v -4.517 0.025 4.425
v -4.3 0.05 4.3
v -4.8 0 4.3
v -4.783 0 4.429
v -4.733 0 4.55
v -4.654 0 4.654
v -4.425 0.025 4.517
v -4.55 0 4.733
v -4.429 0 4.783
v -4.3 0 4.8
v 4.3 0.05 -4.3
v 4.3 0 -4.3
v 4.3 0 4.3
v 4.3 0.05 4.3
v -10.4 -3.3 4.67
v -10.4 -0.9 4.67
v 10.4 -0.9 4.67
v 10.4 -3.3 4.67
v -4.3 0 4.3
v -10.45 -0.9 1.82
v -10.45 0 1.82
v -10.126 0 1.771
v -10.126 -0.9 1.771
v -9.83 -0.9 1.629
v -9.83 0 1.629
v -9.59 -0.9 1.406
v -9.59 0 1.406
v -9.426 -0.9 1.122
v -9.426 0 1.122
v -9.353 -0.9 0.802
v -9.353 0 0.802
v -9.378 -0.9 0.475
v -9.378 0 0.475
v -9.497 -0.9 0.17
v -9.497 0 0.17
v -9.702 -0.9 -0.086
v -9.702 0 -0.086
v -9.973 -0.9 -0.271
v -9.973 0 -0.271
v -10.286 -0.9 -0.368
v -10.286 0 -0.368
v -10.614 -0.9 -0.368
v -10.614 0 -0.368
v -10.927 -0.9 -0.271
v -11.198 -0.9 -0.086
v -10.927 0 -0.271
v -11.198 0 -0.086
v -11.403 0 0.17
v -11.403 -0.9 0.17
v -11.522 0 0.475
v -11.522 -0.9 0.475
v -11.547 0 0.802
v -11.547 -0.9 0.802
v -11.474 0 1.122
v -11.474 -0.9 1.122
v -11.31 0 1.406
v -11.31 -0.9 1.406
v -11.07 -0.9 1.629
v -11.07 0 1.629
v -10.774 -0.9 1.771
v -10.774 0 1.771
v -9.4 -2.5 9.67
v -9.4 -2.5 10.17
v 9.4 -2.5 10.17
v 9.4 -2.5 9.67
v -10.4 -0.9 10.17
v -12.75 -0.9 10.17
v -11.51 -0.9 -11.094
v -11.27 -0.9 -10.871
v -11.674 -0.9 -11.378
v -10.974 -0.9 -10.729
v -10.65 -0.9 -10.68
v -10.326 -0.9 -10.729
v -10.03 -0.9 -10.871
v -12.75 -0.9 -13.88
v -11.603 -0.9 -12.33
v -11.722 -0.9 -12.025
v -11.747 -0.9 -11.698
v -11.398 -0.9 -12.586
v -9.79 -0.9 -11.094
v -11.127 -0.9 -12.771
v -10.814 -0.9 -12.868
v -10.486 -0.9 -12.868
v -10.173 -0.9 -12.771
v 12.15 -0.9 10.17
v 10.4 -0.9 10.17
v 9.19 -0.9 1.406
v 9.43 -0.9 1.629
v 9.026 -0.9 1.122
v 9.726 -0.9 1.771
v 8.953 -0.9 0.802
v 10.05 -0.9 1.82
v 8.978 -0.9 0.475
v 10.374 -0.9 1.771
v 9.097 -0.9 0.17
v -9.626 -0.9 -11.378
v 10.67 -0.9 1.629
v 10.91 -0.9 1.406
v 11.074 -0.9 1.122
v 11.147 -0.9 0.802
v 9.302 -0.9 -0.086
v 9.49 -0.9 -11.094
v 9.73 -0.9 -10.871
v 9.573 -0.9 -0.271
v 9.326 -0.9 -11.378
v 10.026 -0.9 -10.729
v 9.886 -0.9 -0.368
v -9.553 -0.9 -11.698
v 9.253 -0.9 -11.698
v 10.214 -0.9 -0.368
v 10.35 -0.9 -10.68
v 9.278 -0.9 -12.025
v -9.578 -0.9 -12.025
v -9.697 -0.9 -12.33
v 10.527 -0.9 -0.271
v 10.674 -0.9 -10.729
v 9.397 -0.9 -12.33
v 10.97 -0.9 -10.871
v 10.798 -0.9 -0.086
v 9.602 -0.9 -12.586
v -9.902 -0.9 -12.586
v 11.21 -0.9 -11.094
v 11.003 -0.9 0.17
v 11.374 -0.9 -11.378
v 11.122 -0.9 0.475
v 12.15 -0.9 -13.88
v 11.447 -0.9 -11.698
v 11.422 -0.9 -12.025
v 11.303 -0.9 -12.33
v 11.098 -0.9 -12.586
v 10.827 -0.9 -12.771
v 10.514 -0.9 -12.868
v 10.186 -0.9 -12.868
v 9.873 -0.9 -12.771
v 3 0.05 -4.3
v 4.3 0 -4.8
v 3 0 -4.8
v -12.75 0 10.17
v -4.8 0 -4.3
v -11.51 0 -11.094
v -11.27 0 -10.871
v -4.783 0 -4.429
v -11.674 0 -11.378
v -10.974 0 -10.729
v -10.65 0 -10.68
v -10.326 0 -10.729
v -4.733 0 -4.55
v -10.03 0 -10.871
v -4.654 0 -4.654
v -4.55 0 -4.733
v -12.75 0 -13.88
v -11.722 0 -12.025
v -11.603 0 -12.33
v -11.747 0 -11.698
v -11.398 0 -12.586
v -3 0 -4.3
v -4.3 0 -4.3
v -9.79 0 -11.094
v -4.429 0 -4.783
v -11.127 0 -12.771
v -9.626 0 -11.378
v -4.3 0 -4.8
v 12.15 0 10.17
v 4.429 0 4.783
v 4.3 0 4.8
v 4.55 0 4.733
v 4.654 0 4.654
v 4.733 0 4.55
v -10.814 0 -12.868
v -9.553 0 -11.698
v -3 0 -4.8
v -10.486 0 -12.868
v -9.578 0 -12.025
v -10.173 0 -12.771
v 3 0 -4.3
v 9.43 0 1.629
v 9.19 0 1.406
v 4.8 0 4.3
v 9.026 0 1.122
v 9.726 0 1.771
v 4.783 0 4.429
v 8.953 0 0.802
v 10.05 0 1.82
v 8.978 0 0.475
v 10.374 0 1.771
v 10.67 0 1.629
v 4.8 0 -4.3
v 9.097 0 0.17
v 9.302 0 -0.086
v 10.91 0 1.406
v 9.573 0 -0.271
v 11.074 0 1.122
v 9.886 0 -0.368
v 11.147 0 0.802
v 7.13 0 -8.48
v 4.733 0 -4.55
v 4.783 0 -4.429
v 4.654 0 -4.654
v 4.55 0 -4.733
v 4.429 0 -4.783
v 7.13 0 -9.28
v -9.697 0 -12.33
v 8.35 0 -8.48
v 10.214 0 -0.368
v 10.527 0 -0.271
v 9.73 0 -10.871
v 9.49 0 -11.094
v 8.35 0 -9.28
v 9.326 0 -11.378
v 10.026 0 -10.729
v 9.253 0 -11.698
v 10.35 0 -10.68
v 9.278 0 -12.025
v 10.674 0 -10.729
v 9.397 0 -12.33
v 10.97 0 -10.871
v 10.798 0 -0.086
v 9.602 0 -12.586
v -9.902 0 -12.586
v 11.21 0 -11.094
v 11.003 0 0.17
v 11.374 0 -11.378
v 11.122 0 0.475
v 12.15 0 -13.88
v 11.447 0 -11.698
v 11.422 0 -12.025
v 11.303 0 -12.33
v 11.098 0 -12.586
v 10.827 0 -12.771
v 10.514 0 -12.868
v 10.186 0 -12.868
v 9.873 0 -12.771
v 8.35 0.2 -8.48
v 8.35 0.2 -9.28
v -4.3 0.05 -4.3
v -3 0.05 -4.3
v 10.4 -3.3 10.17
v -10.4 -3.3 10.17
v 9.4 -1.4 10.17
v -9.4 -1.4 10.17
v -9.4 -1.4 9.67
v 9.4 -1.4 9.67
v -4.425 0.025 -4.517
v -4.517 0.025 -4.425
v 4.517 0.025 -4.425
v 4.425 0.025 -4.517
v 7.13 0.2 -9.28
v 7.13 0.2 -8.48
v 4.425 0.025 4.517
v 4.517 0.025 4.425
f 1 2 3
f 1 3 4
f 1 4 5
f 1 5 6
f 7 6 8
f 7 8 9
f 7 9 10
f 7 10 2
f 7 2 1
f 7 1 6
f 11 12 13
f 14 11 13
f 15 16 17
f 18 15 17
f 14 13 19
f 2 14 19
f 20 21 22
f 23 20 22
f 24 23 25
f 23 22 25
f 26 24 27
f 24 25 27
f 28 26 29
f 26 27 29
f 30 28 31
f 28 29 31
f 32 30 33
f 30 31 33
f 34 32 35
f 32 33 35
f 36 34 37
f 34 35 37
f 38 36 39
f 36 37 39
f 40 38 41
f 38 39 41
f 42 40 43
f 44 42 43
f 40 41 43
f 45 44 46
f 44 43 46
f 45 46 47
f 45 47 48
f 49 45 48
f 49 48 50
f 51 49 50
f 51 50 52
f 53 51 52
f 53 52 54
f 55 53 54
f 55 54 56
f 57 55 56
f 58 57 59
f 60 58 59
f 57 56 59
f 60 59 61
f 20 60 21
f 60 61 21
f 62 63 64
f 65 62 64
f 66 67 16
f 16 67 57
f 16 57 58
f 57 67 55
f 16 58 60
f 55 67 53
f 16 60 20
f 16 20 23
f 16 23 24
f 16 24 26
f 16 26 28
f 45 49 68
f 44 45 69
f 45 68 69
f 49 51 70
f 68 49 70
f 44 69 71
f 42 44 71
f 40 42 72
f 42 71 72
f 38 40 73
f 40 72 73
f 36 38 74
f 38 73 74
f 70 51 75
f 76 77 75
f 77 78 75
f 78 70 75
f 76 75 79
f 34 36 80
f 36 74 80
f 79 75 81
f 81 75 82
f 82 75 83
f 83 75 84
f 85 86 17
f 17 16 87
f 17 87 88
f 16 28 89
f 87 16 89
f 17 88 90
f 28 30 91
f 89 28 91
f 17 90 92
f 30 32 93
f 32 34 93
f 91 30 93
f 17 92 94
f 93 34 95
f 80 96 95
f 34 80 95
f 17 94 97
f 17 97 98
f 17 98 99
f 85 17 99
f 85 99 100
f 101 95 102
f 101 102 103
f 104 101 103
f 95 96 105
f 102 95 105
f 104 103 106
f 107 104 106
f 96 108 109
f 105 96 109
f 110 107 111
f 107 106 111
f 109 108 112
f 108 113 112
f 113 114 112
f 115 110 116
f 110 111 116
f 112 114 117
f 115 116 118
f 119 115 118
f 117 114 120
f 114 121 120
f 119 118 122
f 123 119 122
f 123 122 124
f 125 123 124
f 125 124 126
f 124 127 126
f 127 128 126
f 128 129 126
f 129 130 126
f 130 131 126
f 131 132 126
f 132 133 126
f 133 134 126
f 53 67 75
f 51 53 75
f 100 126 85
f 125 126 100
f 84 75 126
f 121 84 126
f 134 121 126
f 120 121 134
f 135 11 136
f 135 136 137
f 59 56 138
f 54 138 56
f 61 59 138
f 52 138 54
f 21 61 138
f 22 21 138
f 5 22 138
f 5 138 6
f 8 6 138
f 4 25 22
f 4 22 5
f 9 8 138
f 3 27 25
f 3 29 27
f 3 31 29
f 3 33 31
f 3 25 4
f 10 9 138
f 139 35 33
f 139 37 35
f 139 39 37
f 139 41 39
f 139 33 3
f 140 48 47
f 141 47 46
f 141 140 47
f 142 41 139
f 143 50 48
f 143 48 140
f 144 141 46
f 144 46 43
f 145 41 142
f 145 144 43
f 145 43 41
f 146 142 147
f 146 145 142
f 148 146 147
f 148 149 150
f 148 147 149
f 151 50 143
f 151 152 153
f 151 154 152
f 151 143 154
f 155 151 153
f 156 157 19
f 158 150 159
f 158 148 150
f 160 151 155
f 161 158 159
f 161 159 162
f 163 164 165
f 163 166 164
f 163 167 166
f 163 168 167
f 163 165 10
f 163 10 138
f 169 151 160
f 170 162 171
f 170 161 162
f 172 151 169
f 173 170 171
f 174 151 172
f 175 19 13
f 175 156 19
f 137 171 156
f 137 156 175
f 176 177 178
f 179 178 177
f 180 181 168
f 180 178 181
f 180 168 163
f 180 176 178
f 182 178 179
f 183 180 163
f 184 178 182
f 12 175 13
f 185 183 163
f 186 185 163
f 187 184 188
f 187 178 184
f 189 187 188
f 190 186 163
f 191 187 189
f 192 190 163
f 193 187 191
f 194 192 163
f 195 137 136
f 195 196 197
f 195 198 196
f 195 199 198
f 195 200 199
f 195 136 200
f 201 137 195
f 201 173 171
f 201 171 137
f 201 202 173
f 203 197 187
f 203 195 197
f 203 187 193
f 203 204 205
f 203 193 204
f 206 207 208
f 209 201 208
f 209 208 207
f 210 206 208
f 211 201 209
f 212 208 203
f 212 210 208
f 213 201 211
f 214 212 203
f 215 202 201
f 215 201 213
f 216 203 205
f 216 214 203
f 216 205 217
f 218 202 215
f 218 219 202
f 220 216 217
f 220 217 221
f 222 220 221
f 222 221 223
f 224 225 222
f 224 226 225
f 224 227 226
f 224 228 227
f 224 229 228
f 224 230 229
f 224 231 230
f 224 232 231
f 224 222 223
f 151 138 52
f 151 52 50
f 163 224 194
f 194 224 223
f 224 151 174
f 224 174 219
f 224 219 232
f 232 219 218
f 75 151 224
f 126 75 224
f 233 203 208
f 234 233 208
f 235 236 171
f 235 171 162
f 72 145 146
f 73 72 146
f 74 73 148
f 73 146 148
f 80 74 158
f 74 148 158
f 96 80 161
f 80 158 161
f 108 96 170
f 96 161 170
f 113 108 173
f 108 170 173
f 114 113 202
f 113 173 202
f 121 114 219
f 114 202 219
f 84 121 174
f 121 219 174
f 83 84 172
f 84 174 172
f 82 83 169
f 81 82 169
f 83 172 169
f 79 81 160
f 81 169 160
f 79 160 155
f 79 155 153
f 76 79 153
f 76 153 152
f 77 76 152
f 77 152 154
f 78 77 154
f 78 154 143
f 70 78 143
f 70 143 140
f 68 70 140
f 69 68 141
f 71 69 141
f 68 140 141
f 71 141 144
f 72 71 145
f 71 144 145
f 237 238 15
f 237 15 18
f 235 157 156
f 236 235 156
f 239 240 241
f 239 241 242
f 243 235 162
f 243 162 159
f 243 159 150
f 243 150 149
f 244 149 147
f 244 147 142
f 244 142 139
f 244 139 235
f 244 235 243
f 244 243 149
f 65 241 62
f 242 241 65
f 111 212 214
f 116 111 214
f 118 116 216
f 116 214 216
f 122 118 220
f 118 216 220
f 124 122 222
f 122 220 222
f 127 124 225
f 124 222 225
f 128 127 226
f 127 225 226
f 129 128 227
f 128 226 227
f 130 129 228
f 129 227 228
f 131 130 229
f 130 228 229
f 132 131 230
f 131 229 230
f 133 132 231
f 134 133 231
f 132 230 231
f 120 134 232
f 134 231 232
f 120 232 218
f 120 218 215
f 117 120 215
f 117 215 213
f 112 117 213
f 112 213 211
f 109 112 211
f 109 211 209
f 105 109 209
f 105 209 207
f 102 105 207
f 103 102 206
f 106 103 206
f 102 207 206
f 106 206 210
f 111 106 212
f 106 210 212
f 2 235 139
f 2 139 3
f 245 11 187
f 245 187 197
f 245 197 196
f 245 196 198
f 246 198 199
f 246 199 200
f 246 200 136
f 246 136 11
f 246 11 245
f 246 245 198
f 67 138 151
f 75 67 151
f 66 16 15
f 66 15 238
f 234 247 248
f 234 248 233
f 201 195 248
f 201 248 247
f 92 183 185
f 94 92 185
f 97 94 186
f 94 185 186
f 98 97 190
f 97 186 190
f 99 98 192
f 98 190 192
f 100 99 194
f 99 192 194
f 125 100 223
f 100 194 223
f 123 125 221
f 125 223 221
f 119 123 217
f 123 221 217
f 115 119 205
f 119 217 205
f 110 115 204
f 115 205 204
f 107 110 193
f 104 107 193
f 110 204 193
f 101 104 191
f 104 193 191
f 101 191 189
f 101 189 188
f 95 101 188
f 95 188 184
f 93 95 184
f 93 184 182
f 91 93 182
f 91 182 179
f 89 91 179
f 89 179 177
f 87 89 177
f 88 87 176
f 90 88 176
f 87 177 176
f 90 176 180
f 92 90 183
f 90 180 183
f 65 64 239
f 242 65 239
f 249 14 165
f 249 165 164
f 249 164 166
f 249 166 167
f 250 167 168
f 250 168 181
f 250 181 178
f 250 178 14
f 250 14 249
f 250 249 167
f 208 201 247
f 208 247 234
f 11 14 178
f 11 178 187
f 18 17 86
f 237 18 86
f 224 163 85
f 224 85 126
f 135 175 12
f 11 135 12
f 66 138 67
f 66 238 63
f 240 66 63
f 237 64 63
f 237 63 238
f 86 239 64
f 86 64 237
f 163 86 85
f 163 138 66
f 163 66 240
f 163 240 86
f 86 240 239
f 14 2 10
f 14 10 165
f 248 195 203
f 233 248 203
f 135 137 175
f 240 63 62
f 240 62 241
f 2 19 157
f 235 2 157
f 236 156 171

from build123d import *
from OCP.BRepFilletAPI import BRepFilletAPI_MakeChamfer

# Parameters (mm, degrees)
SKIZZE1_W               = 24.9
SKIZZE1_H               = 24.05
SKIZZE1_R               = 1.1
PCB_DEPTH               = 0.9
BOSS_EXTRUDE1_DEPTH     = 0.05
SKIZZE3_W               = 20.8
SKIZZE3_H               = 5.5
CONNECTOR_CLOSED_DEPTH  = 2.4
ESQUISSE1_W             = 1.22
ESQUISSE1_H             = 0.8
STATUS_LED_DEPTH        = 0.2
ESQUISSE3_W             = 18.8
ESQUISSE3_H             = 1.1
ENL_V_MAT_EXTRU_1_DEPTH = 0.5
FILLET1_R               = 0.5
CHAMFER1_SIZE           = 0.05
CHAMFER1_SIZE_2         = 0.5


with BuildPart() as part:
    # Skizze1 → PCB (new body)
    with BuildSketch(Plane(origin=(0, 0, 0), x_dir=(1, 0, 0), z_dir=(0, 1, 0))):
        with Locations((-0.3, 1.855)):
            Rectangle(SKIZZE1_W, SKIZZE1_H)
        with Locations(Location((-10.65, 11.78, 0), (0, 0, 270))):
            Circle(SKIZZE1_R, mode=Mode.SUBTRACT)
        with Locations(Location((10.35, 11.78, 0), (0, 0, 270))):
            Circle(SKIZZE1_R, mode=Mode.SUBTRACT)
        with Locations(Location((-10.45, -0.72, 0), (0, 0, 270))):
            Circle(SKIZZE1_R, mode=Mode.SUBTRACT)
        with Locations(Location((10.05, -0.72, 0), (0, 0, 270))):
            Circle(SKIZZE1_R, mode=Mode.SUBTRACT)
    extrude(amount=-PCB_DEPTH)

    # Sketch4 → Boss-Extrude1 (add)
    with BuildSketch(Plane(origin=(0, 0, 0), x_dir=(1, 0, 0), z_dir=(0, 1, 0))):
        Polygon((-4.3, 4.3), (-3, 4.3), (-3, 4.8), (-4.8, 4.8), (-4.8, -4.8), (4.8, -4.8), (4.8, 4.8), (3, 4.8), (3, 4.3), (4.3, 4.3), (4.3, -4.3), (-4.3, -4.3), align=None)
    extrude(amount=BOSS_EXTRUDE1_DEPTH)

    # Skizze3 → Connector_closed (add)
    with BuildSketch(Plane.XZ.offset(0.9)):
        with Locations((0, 7.42)):
            Rectangle(SKIZZE3_W, SKIZZE3_H)
    extrude(amount=CONNECTOR_CLOSED_DEPTH)

    # Esquisse1 → Status LED (add)
    with BuildSketch(Plane(origin=(0, 0, 0), x_dir=(1, 0, 0), z_dir=(0, 1, 0))):
        with Locations((7.74, 8.88)):
            Rectangle(ESQUISSE1_W, ESQUISSE1_H)
    extrude(amount=STATUS_LED_DEPTH)

    # Esquisse3 → Enlèv. mat.-Extru.1 (cut)
    with BuildSketch(Plane.XY.offset(10.17)):
        with Locations((0, -1.95)):
            Rectangle(ESQUISSE3_W, ESQUISSE3_H)
    extrude(amount=-ENL_V_MAT_EXTRU_1_DEPTH, mode=Mode.SUBTRACT)

    # Fillet1
    fillet1_edges = [part.edges().sort_by_distance(p)[0] for p in [
        (-4.8, 0.025, -4.8),
        (-4.8, 0.025, 4.8),
        (4.8, 0.025, 4.8),
        (4.8, 0.025, -4.8),
    ]]
    fillet(fillet1_edges, radius=FILLET1_R)

    # Chamfer1
    chamfer1_edges_1 = [part.edges().sort_by_distance(p)[0] for p in [
        (3.65, 0.05, -4.8),
    ]]
    chamfer1_side_1 = [part.faces().sort_by_distance(p)[0] for p in [
        (3.65, 0.049, -4.8),
    ]]
    chamfer1_edges_2 = [part.edges().sort_by_distance(p)[0] for p in [
        (4.8, 0.05, 0),
    ]]
    chamfer1_side_2 = [part.faces().sort_by_distance(p)[0] for p in [
        (4.8, 0.049, 0),
    ]]
    chamfer1_edges_3 = [part.edges().sort_by_distance(p)[0] for p in [
        (0, 0.05, 4.8),
    ]]
    chamfer1_side_3 = [part.faces().sort_by_distance(p)[0] for p in [
        (0, 0.049, 4.8),
    ]]
    chamfer1_edges_4 = [part.edges().sort_by_distance(p)[0] for p in [
        (-4.8, 0.05, 0),
    ]]
    chamfer1_side_4 = [part.faces().sort_by_distance(p)[0] for p in [
        (-4.8, 0.049, 0),
    ]]
    chamfer1_edges_5 = [part.edges().sort_by_distance(p)[0] for p in [
        (-3.65, 0.05, -4.8),
    ]]
    chamfer1_side_5 = [part.faces().sort_by_distance(p)[0] for p in [
        (-3.65, 0.049, -4.8),
    ]]
    chamfer1_edges_6 = [part.edges().sort_by_distance(p)[0] for p in [
        (4.653553391, 0.05, -4.653553391),
    ]]
    chamfer1_side_6 = [part.faces().sort_by_distance(p)[0] for p in [
        (4.653553391, 0.049, -4.653553391),
    ]]
    chamfer1_edges_7 = [part.edges().sort_by_distance(p)[0] for p in [
        (4.653553391, 0.05, 4.653553391),
    ]]
    chamfer1_side_7 = [part.faces().sort_by_distance(p)[0] for p in [
        (4.653553391, 0.049, 4.653553391),
    ]]
    chamfer1_edges_8 = [part.edges().sort_by_distance(p)[0] for p in [
        (-4.653553391, 0.05, 4.653553391),
    ]]
    chamfer1_side_8 = [part.faces().sort_by_distance(p)[0] for p in [
        (-4.653553391, 0.049, 4.653553391),
    ]]
    chamfer1_edges_9 = [part.edges().sort_by_distance(p)[0] for p in [
        (-4.653553391, 0.05, -4.653553391),
    ]]
    chamfer1_side_9 = [part.faces().sort_by_distance(p)[0] for p in [
        (-4.653553391, 0.049, -4.653553391),
    ]]
    chamfer1 = BRepFilletAPI_MakeChamfer(part.part.solid().wrapped)
    for e in chamfer1_edges_1:
        chamfer1.Add(CHAMFER1_SIZE - 0.0001, CHAMFER1_SIZE_2 - 0.0001, e.wrapped, chamfer1_side_1[0].wrapped)
    for e in chamfer1_edges_2:
        chamfer1.Add(CHAMFER1_SIZE - 0.0001, CHAMFER1_SIZE_2 - 0.0001, e.wrapped, chamfer1_side_2[0].wrapped)
    for e in chamfer1_edges_3:
        chamfer1.Add(CHAMFER1_SIZE - 0.0001, CHAMFER1_SIZE_2 - 0.0001, e.wrapped, chamfer1_side_3[0].wrapped)
    for e in chamfer1_edges_4:
        chamfer1.Add(CHAMFER1_SIZE - 0.0001, CHAMFER1_SIZE_2 - 0.0001, e.wrapped, chamfer1_side_4[0].wrapped)
    for e in chamfer1_edges_5:
        chamfer1.Add(CHAMFER1_SIZE - 0.0001, CHAMFER1_SIZE_2 - 0.0001, e.wrapped, chamfer1_side_5[0].wrapped)
    for e in chamfer1_edges_6:
        chamfer1.Add(CHAMFER1_SIZE - 0.0001, CHAMFER1_SIZE_2 - 0.0001, e.wrapped, chamfer1_side_6[0].wrapped)
    for e in chamfer1_edges_7:
        chamfer1.Add(CHAMFER1_SIZE - 0.0001, CHAMFER1_SIZE_2 - 0.0001, e.wrapped, chamfer1_side_7[0].wrapped)
    for e in chamfer1_edges_8:
        chamfer1.Add(CHAMFER1_SIZE - 0.0001, CHAMFER1_SIZE_2 - 0.0001, e.wrapped, chamfer1_side_8[0].wrapped)
    for e in chamfer1_edges_9:
        chamfer1.Add(CHAMFER1_SIZE - 0.0001, CHAMFER1_SIZE_2 - 0.0001, e.wrapped, chamfer1_side_9[0].wrapped)
    add(Compound.cast(chamfer1.Shape()), mode=Mode.REPLACE)  # a hair under: the kernel refuses the full size


solid = part.part
